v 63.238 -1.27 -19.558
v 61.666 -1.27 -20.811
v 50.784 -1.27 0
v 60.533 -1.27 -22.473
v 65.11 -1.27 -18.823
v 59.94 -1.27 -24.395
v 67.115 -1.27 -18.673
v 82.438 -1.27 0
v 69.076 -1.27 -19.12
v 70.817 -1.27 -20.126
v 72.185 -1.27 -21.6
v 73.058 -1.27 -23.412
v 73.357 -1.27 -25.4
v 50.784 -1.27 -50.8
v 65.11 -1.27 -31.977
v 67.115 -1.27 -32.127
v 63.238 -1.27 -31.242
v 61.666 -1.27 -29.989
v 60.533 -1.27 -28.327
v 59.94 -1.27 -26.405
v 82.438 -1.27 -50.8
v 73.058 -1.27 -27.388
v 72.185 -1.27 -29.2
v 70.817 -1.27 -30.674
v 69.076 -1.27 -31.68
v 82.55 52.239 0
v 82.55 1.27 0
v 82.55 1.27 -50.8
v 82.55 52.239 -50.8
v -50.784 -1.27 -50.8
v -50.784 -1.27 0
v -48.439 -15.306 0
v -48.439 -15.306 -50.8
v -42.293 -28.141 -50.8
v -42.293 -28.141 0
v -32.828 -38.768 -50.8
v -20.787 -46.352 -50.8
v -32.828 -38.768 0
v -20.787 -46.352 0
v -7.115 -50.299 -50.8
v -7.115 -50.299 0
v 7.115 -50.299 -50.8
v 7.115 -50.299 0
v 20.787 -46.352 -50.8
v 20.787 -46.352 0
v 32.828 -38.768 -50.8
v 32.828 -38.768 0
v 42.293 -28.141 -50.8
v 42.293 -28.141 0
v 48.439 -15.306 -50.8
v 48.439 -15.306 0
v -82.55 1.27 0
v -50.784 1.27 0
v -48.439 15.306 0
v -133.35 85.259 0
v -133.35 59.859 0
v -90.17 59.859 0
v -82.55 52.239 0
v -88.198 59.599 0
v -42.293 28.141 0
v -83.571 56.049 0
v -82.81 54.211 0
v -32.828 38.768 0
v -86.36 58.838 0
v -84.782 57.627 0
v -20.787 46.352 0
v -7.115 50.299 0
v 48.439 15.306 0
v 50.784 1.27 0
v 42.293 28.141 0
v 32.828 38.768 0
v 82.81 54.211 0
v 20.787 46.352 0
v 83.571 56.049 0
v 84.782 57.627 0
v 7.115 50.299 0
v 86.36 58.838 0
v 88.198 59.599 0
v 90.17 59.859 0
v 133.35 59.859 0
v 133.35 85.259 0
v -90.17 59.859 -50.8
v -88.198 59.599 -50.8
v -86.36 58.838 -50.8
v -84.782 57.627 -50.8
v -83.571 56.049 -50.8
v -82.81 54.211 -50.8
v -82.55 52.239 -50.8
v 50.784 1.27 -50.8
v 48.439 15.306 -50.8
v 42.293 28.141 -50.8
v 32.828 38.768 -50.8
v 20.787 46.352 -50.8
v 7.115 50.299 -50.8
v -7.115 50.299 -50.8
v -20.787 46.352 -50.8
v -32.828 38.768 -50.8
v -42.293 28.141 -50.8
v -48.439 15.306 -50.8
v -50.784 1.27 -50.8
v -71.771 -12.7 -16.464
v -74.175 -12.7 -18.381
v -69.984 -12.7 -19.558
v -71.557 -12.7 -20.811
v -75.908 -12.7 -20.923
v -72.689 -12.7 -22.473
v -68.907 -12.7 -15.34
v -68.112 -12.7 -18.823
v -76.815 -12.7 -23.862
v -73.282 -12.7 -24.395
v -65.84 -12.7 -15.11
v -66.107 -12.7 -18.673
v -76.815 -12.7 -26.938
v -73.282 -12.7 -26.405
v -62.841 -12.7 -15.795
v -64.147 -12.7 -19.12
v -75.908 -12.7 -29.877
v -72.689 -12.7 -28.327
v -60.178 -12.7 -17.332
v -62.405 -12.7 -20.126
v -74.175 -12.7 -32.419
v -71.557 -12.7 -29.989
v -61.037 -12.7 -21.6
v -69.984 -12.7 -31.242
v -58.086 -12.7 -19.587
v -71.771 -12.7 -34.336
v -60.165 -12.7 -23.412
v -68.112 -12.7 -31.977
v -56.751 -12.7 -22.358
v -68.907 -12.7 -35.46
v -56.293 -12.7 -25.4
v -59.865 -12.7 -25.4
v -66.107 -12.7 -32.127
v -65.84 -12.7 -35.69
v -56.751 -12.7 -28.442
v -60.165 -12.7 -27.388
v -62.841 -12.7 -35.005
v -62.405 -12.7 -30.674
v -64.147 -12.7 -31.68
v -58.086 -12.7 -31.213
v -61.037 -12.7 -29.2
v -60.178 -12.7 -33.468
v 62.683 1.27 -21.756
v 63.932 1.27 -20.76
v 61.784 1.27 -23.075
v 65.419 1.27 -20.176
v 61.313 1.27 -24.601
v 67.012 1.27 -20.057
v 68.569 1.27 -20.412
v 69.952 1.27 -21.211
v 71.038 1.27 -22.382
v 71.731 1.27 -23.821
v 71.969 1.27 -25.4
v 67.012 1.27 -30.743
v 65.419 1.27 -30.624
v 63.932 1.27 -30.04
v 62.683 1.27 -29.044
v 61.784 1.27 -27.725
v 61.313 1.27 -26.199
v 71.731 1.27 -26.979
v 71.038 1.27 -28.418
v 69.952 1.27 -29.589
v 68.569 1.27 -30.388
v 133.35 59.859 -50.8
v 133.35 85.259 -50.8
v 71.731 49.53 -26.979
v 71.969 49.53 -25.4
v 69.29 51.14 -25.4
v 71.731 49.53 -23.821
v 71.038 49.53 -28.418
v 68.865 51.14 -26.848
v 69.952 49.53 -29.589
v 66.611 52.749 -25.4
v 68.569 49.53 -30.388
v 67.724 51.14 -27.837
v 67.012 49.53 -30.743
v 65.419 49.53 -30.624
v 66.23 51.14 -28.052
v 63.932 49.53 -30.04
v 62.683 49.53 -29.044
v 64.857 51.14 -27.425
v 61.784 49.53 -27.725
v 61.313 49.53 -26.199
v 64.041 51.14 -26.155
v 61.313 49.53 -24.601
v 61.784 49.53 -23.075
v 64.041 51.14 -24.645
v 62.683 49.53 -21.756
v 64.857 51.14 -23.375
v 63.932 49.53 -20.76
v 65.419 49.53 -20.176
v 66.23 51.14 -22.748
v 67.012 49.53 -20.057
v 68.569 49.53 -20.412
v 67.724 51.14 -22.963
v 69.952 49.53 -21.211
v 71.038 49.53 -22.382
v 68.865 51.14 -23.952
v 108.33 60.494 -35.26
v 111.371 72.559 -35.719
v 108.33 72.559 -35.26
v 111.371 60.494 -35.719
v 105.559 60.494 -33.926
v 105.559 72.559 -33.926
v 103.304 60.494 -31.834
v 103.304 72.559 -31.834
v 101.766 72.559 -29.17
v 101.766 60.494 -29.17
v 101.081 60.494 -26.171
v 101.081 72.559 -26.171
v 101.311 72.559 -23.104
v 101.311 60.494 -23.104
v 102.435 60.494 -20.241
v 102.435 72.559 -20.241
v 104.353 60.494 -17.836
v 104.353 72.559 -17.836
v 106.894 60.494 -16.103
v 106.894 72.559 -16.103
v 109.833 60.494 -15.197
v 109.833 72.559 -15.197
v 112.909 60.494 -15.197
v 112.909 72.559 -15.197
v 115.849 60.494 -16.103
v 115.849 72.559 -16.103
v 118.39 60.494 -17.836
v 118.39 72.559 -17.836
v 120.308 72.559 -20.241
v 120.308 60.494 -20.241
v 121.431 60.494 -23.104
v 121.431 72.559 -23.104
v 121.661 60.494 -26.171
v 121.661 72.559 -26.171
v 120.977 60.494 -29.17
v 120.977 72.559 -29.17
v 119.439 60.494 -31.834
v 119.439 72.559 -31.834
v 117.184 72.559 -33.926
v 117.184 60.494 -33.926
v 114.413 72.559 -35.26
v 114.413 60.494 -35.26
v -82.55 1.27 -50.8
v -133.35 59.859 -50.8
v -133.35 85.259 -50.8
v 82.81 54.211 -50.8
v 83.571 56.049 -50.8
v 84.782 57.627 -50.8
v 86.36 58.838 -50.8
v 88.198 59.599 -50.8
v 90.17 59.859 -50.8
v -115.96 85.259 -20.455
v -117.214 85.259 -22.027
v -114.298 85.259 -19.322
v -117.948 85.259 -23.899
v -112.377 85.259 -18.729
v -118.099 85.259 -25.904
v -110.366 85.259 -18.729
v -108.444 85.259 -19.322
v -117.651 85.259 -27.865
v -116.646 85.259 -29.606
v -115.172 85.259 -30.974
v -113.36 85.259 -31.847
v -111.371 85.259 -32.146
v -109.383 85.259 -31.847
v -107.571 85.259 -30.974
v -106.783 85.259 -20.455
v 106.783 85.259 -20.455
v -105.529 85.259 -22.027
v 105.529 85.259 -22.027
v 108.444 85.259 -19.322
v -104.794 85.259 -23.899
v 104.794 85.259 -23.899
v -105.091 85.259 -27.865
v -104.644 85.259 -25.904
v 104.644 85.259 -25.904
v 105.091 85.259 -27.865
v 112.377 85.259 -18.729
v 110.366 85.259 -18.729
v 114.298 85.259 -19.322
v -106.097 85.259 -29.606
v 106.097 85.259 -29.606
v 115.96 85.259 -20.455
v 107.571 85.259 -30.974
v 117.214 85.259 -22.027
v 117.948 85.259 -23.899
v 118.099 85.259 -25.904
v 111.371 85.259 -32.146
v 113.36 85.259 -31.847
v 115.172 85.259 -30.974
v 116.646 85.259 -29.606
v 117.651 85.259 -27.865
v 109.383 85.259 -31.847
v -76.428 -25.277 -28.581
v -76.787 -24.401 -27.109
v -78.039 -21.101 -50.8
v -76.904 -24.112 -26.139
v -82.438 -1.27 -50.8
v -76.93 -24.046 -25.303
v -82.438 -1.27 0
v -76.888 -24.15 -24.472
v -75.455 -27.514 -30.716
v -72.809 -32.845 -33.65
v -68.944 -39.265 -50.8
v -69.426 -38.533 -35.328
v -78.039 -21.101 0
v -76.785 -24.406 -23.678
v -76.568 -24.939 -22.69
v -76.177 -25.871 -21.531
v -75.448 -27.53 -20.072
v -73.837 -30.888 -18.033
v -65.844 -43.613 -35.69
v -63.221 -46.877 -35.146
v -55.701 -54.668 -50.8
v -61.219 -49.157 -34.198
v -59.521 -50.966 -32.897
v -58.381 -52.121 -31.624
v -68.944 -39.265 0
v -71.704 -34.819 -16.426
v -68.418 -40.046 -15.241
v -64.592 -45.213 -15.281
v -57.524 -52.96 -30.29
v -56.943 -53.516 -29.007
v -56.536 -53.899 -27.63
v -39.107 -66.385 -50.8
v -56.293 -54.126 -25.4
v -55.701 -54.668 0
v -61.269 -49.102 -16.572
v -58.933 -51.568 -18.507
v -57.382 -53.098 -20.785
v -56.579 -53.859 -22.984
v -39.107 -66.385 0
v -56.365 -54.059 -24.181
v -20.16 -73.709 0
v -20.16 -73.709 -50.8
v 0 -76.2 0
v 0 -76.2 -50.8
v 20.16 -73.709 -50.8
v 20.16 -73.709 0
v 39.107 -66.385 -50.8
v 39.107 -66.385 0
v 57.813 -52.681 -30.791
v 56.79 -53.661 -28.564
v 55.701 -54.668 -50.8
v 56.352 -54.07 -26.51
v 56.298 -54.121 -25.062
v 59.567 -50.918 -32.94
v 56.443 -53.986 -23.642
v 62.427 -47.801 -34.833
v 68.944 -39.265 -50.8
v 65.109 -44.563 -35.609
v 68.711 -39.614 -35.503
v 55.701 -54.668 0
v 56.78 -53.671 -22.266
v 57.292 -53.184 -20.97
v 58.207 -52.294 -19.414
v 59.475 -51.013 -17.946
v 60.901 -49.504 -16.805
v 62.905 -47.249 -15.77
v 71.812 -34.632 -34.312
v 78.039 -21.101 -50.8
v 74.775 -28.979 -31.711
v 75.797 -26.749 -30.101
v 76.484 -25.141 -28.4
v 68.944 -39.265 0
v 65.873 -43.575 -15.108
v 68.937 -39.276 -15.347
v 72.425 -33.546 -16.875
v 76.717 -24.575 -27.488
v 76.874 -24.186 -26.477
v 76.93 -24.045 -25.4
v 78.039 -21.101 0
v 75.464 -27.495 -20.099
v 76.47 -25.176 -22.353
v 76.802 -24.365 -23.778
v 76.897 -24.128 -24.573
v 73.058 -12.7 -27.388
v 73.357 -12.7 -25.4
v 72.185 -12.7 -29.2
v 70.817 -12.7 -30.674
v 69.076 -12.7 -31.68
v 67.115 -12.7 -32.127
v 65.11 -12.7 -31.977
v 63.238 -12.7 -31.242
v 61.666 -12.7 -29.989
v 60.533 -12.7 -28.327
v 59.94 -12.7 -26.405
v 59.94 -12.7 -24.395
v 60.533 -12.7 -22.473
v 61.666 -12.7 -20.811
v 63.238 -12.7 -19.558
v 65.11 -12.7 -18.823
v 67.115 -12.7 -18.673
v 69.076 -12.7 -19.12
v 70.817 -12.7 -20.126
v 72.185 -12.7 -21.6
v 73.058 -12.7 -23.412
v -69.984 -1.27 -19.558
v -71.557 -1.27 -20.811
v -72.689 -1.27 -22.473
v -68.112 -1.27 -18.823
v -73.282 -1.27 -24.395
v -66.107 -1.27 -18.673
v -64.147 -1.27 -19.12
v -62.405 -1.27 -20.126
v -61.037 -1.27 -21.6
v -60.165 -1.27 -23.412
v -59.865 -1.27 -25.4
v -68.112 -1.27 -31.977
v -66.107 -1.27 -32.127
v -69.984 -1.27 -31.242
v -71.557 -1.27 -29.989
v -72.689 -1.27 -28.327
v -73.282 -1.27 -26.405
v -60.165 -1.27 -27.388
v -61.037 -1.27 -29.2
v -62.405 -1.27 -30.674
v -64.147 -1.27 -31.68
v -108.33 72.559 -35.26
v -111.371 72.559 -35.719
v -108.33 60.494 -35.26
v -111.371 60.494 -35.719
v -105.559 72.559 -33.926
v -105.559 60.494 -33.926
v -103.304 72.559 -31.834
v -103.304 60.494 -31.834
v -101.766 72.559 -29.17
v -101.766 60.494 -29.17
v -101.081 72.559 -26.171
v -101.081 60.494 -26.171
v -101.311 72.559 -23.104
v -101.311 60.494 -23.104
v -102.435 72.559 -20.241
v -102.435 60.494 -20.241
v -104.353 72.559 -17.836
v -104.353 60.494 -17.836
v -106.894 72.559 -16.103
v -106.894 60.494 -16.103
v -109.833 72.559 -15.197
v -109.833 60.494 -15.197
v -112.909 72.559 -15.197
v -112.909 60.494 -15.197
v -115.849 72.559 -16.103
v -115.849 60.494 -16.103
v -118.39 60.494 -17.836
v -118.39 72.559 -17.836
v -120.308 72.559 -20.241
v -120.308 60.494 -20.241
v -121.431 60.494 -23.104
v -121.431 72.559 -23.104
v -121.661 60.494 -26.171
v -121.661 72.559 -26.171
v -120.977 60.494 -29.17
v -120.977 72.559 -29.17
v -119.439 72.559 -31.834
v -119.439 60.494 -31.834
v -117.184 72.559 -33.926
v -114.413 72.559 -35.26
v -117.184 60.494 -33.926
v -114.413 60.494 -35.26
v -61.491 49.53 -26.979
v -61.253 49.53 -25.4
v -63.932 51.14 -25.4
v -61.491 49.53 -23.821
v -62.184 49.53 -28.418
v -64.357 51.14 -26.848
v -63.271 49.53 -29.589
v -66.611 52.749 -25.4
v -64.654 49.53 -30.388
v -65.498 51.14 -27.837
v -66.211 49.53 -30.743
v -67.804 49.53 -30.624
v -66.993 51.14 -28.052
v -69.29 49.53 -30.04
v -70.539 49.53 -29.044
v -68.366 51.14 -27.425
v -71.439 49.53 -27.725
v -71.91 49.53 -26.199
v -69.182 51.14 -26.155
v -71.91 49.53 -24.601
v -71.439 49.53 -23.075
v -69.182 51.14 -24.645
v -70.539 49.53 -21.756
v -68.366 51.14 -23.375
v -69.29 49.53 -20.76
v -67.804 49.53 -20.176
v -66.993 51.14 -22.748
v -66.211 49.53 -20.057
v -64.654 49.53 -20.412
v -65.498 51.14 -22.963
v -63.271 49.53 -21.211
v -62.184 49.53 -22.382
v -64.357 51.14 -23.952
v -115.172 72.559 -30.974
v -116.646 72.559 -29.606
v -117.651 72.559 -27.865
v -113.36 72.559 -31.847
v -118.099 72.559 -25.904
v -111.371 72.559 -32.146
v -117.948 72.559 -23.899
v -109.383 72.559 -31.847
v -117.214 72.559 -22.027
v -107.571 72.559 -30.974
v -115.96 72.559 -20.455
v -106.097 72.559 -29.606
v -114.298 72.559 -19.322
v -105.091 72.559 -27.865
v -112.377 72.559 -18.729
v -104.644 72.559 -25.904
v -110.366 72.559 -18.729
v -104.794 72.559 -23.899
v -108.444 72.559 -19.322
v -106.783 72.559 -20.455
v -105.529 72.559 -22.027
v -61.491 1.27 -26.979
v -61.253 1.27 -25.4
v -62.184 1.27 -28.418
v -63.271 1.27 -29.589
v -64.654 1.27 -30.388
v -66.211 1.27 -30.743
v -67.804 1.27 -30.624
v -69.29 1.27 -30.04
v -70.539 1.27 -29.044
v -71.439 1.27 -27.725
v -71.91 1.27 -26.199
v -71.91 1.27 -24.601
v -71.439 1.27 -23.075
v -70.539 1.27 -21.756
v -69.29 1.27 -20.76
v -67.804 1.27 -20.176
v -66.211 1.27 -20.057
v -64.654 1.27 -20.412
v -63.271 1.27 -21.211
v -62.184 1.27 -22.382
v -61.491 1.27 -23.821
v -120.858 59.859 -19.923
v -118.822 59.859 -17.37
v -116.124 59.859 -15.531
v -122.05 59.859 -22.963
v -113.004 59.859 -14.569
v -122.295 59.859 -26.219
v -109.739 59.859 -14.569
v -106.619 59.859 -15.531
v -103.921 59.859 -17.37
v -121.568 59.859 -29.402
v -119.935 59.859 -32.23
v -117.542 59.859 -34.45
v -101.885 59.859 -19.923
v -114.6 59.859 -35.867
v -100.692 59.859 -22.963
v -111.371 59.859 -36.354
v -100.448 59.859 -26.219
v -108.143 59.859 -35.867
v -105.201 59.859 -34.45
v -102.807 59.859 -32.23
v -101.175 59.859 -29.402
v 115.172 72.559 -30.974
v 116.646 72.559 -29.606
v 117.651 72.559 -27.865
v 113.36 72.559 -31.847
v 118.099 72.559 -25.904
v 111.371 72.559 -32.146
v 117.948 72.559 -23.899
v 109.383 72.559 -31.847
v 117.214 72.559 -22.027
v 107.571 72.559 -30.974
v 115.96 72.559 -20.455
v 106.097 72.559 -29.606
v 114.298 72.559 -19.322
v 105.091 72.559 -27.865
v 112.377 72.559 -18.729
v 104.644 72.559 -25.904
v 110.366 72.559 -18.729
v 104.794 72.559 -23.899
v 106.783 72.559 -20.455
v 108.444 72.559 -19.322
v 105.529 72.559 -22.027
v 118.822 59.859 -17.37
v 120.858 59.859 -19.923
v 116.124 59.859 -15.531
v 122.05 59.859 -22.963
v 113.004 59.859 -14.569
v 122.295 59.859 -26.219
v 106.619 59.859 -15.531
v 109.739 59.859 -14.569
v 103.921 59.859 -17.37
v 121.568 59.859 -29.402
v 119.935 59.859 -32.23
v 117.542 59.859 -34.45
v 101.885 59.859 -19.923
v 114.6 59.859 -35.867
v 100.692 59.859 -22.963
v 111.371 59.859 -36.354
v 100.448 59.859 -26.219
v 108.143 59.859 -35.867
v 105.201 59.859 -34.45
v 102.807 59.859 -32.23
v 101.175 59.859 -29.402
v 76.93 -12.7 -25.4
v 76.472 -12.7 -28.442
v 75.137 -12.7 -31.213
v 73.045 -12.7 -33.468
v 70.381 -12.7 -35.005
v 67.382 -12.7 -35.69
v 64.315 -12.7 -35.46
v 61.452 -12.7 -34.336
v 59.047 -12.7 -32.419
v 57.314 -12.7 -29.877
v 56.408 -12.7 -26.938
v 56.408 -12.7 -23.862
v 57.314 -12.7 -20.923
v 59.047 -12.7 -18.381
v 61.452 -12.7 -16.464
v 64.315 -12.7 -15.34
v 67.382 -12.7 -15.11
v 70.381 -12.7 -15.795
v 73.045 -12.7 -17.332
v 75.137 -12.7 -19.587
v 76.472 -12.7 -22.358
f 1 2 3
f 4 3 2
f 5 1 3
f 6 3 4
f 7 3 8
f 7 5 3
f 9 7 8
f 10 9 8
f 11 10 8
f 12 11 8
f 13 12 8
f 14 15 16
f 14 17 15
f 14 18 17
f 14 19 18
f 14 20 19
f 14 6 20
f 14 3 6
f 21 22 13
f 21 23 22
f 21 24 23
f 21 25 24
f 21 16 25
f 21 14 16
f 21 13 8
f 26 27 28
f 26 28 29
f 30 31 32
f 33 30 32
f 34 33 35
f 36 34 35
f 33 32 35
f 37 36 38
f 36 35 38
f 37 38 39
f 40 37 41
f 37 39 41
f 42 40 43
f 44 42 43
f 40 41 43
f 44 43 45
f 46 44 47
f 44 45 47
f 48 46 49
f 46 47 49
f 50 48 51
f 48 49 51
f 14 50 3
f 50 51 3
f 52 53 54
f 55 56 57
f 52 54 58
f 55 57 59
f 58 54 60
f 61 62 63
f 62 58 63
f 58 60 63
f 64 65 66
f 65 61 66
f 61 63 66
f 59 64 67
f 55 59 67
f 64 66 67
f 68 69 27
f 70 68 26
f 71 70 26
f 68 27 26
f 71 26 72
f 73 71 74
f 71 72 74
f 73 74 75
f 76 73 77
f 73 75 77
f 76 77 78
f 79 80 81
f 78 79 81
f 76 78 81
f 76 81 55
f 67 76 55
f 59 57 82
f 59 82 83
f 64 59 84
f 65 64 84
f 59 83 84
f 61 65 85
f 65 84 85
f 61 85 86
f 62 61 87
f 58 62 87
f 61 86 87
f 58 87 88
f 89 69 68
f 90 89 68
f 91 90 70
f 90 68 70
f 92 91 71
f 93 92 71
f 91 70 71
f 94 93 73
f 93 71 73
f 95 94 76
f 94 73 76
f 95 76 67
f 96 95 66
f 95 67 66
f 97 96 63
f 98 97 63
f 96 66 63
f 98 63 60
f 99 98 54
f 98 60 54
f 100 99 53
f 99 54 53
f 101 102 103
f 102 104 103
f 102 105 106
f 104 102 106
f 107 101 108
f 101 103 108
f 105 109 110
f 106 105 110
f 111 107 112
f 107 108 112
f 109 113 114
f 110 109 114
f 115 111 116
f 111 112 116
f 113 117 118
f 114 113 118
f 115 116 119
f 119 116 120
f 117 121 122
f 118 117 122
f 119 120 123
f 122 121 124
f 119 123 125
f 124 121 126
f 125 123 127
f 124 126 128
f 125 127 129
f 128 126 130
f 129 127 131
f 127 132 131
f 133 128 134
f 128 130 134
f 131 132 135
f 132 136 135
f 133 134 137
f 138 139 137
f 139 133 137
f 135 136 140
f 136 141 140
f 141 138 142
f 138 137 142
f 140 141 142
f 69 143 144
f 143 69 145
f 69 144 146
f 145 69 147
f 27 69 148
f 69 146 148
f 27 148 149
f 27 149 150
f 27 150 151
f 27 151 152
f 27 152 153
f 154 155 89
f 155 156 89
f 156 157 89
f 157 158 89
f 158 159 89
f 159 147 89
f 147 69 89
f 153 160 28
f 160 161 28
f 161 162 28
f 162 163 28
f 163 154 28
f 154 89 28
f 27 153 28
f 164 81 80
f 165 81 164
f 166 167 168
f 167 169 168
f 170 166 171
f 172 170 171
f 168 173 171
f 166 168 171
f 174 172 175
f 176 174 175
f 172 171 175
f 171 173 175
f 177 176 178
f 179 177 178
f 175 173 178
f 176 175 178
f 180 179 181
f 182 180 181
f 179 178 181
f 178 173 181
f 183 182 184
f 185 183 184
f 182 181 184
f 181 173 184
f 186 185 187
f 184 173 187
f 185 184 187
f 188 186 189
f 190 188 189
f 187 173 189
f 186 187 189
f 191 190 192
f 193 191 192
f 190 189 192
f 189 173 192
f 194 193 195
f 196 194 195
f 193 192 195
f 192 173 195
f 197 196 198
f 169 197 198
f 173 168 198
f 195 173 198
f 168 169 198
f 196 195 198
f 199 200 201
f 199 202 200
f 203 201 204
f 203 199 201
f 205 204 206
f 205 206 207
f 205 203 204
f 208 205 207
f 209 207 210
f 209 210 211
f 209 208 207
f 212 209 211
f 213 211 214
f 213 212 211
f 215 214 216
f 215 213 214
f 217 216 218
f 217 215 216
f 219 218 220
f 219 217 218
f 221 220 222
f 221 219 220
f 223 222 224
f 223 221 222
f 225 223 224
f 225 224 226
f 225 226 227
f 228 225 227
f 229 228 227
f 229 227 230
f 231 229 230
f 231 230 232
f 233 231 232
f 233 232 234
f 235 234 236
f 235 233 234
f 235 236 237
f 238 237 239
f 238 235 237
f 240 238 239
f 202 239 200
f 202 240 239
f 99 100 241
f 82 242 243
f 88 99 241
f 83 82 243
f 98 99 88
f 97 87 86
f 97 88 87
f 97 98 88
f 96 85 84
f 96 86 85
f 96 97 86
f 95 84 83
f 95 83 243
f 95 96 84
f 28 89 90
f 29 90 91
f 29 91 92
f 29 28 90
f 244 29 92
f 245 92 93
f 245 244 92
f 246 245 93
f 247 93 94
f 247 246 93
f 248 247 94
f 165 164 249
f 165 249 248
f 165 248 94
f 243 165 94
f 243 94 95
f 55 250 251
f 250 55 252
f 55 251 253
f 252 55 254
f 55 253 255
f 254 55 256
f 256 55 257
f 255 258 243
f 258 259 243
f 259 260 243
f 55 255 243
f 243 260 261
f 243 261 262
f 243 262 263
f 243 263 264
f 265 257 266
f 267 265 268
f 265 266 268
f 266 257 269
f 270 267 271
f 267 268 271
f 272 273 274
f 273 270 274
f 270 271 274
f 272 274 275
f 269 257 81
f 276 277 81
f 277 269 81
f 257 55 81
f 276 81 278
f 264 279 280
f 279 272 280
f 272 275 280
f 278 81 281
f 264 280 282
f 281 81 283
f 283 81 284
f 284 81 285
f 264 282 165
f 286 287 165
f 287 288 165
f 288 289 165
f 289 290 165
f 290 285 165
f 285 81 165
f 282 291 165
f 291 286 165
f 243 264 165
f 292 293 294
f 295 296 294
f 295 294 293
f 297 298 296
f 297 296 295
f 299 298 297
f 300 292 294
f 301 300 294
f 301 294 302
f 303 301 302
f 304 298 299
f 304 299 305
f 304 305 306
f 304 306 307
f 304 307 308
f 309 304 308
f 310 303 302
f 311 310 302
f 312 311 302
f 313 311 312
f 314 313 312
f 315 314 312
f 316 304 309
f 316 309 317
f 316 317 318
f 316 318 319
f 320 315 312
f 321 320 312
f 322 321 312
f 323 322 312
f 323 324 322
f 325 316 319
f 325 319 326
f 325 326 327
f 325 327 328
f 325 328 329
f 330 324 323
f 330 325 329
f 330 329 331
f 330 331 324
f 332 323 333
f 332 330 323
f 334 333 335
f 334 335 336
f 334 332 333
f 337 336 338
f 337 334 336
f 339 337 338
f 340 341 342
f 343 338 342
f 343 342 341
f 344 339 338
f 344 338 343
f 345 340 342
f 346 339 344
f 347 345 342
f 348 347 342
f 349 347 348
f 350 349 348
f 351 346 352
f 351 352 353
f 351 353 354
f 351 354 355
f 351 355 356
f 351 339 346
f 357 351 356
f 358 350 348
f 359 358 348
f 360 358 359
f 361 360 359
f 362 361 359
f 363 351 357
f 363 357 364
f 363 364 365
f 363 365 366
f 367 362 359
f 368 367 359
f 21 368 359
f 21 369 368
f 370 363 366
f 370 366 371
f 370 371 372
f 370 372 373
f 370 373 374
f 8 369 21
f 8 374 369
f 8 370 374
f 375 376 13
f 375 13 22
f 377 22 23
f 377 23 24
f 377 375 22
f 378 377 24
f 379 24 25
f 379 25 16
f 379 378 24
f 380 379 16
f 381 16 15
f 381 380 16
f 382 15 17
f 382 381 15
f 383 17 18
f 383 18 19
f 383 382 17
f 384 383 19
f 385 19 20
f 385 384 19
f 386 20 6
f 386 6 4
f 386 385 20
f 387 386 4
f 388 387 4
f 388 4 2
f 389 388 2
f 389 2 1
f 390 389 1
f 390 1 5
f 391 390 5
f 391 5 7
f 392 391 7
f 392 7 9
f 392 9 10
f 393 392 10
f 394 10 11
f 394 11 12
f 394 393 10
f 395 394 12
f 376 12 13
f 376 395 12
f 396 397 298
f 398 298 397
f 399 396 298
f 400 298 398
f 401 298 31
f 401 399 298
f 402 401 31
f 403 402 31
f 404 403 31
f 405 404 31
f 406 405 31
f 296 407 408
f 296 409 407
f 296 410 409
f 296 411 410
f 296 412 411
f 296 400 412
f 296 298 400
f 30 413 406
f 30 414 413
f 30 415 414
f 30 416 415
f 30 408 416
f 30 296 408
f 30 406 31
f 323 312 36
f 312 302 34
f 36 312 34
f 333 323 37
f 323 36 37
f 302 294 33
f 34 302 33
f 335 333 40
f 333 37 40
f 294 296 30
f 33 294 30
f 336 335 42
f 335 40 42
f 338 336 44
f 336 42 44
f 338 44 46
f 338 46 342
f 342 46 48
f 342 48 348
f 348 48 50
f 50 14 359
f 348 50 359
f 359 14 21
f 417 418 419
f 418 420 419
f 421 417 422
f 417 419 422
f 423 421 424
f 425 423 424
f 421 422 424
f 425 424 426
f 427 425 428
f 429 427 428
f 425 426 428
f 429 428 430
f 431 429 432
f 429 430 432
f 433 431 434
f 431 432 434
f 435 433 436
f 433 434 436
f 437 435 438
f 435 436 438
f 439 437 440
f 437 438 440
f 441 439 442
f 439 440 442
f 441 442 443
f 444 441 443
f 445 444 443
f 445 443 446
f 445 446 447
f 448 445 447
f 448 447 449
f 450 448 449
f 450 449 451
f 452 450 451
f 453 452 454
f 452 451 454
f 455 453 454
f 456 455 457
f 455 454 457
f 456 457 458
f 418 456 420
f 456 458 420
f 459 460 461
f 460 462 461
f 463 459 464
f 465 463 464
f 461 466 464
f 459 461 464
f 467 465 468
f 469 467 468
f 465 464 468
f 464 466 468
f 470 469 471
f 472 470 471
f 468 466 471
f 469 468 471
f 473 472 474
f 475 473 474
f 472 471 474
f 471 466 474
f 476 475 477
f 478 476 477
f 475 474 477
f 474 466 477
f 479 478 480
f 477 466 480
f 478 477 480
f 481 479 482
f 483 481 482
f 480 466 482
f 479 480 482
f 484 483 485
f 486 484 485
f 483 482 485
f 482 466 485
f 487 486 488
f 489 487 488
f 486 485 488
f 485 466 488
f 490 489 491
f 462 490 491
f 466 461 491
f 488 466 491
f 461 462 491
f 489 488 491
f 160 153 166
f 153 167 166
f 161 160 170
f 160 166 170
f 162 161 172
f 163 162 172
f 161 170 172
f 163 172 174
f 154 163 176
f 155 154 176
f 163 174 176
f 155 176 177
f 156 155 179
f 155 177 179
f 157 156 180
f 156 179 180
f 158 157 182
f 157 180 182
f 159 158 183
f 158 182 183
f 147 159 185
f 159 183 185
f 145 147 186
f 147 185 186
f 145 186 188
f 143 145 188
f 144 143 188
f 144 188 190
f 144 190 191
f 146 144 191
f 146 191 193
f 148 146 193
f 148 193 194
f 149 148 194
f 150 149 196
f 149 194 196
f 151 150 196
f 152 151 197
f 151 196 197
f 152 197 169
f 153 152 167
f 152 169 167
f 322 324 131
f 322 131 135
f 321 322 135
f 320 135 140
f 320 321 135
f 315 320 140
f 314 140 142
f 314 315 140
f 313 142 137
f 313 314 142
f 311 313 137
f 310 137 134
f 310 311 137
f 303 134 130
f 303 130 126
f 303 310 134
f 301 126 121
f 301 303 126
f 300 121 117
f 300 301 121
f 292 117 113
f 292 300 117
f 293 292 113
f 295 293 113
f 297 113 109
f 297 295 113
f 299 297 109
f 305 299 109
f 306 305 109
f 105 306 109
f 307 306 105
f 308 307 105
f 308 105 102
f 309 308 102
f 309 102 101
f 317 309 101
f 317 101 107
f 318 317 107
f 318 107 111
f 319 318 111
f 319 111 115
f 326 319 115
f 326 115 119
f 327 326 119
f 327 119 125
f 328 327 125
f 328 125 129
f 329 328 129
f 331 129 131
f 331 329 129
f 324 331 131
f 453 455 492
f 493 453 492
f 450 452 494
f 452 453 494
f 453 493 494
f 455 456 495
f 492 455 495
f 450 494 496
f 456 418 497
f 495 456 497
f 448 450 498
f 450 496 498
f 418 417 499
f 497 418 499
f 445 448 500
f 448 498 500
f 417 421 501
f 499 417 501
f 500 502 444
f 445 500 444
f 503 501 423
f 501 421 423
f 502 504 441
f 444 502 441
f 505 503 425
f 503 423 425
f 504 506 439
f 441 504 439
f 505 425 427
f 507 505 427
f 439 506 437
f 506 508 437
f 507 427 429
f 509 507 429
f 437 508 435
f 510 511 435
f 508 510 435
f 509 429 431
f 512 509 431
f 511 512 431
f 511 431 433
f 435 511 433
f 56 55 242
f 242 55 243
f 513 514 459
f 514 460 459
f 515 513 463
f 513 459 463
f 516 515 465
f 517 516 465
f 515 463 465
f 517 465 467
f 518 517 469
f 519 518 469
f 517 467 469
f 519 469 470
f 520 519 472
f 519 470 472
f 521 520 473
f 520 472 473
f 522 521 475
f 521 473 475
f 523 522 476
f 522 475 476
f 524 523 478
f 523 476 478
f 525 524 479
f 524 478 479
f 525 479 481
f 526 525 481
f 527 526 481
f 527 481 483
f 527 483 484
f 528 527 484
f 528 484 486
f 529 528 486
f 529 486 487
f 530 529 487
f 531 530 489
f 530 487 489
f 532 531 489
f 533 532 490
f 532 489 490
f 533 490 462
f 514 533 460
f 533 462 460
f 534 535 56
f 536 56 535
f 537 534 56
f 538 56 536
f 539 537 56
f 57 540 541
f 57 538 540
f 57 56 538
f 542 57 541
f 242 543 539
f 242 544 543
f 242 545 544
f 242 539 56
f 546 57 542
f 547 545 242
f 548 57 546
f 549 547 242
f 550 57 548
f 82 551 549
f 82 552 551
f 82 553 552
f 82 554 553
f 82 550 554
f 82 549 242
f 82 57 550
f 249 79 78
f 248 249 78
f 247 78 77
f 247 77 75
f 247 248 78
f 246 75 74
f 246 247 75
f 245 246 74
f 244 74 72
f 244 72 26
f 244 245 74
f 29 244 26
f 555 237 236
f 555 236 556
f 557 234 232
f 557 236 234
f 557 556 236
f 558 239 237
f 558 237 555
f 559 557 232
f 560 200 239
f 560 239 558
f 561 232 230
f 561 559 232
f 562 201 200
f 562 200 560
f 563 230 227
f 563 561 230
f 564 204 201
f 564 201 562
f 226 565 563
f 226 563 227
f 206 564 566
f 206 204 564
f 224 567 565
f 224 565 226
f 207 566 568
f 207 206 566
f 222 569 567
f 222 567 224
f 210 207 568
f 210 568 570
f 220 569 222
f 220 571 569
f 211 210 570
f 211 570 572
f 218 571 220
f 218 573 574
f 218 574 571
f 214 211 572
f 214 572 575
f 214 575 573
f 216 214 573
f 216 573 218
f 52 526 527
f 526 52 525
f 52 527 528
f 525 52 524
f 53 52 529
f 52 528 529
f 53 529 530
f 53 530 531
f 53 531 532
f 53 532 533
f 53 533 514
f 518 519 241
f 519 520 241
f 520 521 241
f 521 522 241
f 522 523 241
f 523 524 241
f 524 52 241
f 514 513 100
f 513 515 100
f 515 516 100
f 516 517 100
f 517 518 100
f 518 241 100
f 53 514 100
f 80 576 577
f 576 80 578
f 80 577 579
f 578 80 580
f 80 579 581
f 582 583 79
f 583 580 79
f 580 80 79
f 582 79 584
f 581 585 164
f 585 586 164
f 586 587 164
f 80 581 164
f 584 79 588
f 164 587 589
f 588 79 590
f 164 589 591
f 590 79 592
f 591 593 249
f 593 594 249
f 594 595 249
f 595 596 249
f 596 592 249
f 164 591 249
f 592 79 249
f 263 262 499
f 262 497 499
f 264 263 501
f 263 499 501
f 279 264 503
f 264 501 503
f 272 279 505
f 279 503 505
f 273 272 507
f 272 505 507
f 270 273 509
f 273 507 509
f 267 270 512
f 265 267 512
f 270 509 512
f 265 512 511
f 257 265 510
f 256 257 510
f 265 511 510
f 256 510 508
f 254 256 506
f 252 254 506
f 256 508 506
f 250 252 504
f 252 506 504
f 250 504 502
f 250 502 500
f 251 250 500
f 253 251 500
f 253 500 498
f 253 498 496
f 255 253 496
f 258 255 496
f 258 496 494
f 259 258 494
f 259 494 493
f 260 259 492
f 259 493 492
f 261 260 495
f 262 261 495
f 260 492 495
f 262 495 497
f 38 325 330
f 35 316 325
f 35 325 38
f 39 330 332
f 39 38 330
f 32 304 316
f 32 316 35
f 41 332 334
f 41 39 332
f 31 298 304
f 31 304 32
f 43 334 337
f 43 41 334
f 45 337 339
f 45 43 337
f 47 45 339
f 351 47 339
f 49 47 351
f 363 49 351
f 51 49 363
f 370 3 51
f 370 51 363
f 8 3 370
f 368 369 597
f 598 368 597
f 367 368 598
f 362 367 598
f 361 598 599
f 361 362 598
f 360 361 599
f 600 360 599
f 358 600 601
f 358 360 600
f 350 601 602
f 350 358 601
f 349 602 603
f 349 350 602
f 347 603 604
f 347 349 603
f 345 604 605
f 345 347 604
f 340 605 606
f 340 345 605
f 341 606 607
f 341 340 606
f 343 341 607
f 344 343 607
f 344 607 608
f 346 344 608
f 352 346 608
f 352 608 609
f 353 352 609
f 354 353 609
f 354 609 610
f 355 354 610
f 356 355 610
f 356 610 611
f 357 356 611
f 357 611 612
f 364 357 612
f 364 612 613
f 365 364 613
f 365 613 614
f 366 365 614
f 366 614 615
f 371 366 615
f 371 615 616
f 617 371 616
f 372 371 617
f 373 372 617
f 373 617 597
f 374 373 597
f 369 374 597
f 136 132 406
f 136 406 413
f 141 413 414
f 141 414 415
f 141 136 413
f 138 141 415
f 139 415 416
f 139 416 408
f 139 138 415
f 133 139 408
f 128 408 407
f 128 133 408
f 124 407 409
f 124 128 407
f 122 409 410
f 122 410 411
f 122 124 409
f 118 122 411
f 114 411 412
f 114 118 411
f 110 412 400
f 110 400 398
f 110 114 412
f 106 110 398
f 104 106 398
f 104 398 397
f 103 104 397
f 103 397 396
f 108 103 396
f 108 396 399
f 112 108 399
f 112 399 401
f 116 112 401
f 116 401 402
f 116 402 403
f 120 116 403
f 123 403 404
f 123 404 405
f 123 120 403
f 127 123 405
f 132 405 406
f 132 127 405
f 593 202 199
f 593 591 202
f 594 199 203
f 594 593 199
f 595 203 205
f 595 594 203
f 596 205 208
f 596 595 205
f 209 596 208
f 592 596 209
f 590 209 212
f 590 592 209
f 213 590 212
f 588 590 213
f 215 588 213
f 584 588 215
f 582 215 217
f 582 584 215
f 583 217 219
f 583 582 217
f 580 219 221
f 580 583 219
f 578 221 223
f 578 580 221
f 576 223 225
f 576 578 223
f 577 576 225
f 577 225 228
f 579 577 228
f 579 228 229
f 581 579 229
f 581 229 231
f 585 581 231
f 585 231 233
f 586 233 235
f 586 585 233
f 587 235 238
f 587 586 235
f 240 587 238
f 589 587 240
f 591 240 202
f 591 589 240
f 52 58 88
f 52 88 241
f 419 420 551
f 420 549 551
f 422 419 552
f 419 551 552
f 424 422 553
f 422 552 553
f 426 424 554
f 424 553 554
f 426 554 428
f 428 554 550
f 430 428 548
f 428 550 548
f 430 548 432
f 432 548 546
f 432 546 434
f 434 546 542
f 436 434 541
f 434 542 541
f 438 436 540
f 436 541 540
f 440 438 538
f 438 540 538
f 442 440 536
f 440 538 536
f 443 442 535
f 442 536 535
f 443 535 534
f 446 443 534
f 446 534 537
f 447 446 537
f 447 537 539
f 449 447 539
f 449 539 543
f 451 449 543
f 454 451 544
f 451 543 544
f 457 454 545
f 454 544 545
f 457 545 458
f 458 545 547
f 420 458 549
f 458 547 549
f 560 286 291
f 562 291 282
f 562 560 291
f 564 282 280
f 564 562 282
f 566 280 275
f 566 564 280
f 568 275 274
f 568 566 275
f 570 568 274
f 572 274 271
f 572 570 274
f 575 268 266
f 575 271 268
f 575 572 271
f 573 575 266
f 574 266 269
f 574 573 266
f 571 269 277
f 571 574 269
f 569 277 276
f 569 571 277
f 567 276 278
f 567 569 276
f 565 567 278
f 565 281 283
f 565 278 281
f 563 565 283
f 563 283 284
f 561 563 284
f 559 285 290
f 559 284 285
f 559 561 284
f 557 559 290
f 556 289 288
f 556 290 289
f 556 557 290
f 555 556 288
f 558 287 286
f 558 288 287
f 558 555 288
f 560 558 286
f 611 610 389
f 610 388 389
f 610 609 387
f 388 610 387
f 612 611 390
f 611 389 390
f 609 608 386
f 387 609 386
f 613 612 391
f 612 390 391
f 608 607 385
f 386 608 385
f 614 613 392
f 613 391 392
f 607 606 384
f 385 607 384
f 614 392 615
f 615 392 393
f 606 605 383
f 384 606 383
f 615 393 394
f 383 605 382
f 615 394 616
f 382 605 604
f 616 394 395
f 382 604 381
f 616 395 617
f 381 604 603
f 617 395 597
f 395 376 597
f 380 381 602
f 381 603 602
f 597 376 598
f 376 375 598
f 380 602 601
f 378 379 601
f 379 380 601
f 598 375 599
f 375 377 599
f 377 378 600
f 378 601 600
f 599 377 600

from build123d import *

# Parameters (mm, degrees)
SKETCH1_R                 = 50.8
BOSS_EXTRUDE1_DEPTH       = 50.8
CUT_EXTRUDE1_DEPTH        = 130.090044469
CUT_EXTRUDE1_DEPTH_BACK   = 130.090044469
SKETCH2_W                 = 165.1
SKETCH2_H                 = 2.54
ADVANCEDHOLE1_START       = -54.125920427
ADVANCEDHOLE1_OUTLINE_R   = 10.31875
ADVANCEDHOLE1_DEPTH       = 41.425920427
ADVANCEDHOLE1_START_2     = -12.7
ADVANCEDHOLE1_2_OUTLINE_R = 6.74624
ADVANCEDHOLE1_2_DEPTH     = 11.43
SKETCH10_W                = 50.8
SKETCH10_H                = 25.4
BOSS_EXTRUDE2_DEPTH       = 50.8
FILLET1_R                 = 7.62


# Read off the part's stored shape, not the designer's step: AdvancedHole1
with BuildPart() as part:
    # Sketch1 → Boss-Extrude1 (new body)
    with BuildSketch(Plane.XY):
        with BuildLine():
            Line((82.55, 85.259), (-82.55, 85.259))
            Line((-82.55, 85.259), (-82.55, 0))
            ThreePointArc((-82.55, 0), (0, -76.2), (82.55, 0))
            Line((82.55, 0), (82.55, 85.259))
        make_face()
        Circle(SKETCH1_R, mode=Mode.SUBTRACT)
    extrude(amount=-BOSS_EXTRUDE1_DEPTH)

    # Sketch2 → Cut-Extrude1 (cut, two sides: drawn at the far end of the back side and taken through both)
    with BuildSketch(Plane.XY.offset(-CUT_EXTRUDE1_DEPTH_BACK)):
        Rectangle(SKETCH2_W, SKETCH2_H)
    extrude(amount=CUT_EXTRUDE1_DEPTH + CUT_EXTRUDE1_DEPTH_BACK, mode=Mode.SUBTRACT)


with BuildPart() as cut_extrude1_piece_1:
    # of the separate pieces the step leaves, piece 1, a body of its own (cut_extrude1_pieces)
    add(part.part.solids().sort_by_distance((82.55, 1.27, 0))[0])

    # AdvancedHole1 3 outline → AdvancedHole1 3 (revolve, cut)
    with BuildSketch(Plane(origin=(66.61125751, 0, -25.4), x_dir=(1, 0, 0), z_dir=(0, 0, 1))):
        Polygon((5.35813, 1.27), (5.35813, 49.53), (0, 52.749489309), (0, 1.27), align=None)
    revolve(axis=Axis((66.61125751, 0, -25.4), (0, 1, 0)), mode=Mode.SUBTRACT)

    # AdvancedHole1 4 outline → AdvancedHole1 4 (revolve, cut)
    with BuildSketch(Plane(origin=(-66.61125751, 0, -25.4), x_dir=(1, 0, 0), z_dir=(0, 0, 1))):
        Polygon((5.35813, 1.27), (5.35813, 49.53), (0, 52.749489309), (0, 1.27), align=None)
    revolve(axis=Axis((-66.61125751, 0, -25.4), (0, 1, 0)), mode=Mode.SUBTRACT)

    # Sketch10 → Boss-Extrude2 (add)
    with BuildSketch(Plane(origin=(82.55, 0, 0), x_dir=(0, 0, -1), z_dir=(1, 0, 0))):
        with Locations((25.4, 72.559)):
            Rectangle(SKETCH10_W, SKETCH10_H)
    boss_extrude2 = extrude(amount=BOSS_EXTRUDE2_DEPTH)

    # Sketch12 → CBORE for 1/2 Socket Head Cap Screw1 (revolve, cut)
    with BuildSketch(Plane(origin=(111.37138, 59.859, -25.4), x_dir=(0, 0, -1), z_dir=(1, 0, 0))):
        Polygon((0, 0), (0, 25.401), (6.74624, 25.401), (6.74624, 12.7), (10.31875, 12.7), (10.31875, 0.635), (10.95375, 0), align=None)
    cbore_for_1_2_socket_head_cap_screw1 = revolve(axis=Axis((111.37138, 53.509, -25.4), (0, 1, 0)), mode=Mode.SUBTRACT)

    # Mirror1: Boss-Extrude2, CBORE for 1/2 Socket Head Cap Screw1 across plane
    add(boss_extrude2.mirror(Plane(origin=(0, 0, 0), x_dir=(0, 0, 1), z_dir=(1, 0, 0))))
    add(cbore_for_1_2_socket_head_cap_screw1.mirror(Plane(origin=(0, 0, 0), x_dir=(0, 0, 1), z_dir=(1, 0, 0))), mode=Mode.SUBTRACT)

    # Fillet1
    fillet1_edges = [cut_extrude1_piece_1.edges().sort_by_distance(p)[0] for p in [
        (82.55, 59.859, -25.4),
        (-82.55, 59.859, -25.4),
    ]]
    fillet(fillet1_edges, radius=FILLET1_R)


with BuildPart() as cut_extrude1_piece_2:
    # of the separate pieces the step leaves, piece 2, a body of its own (cut_extrude1_pieces)
    add(part.part.solids().sort_by_distance((-82.438392502, -1.27, 0))[0])

    # AdvancedHole1 outline → AdvancedHole1 (cut)
    with BuildSketch(Plane(origin=(0, 0, 0), x_dir=(1, 0, 0), z_dir=(0, 1, 0)).offset(ADVANCEDHOLE1_START)):
        with Locations((66.61125751, 25.4)):
            Circle(ADVANCEDHOLE1_OUTLINE_R)
        with Locations((-66.61125751, 25.4)):
            Circle(ADVANCEDHOLE1_OUTLINE_R)
    extrude(amount=ADVANCEDHOLE1_DEPTH, mode=Mode.SUBTRACT)

    # AdvancedHole1 2 outline → AdvancedHole1 2 (cut)
    with BuildSketch(Plane(origin=(0, 0, 0), x_dir=(1, 0, 0), z_dir=(0, 1, 0)).offset(ADVANCEDHOLE1_START_2)):
        with Locations((66.61125751, 25.4)):
            Circle(ADVANCEDHOLE1_2_OUTLINE_R)
        with Locations((-66.61125751, 25.4)):
            Circle(ADVANCEDHOLE1_2_OUTLINE_R)
    extrude(amount=ADVANCEDHOLE1_2_DEPTH, mode=Mode.SUBTRACT)


solid = Compound([cut_extrude1_piece_1.part, cut_extrude1_piece_2.part])
